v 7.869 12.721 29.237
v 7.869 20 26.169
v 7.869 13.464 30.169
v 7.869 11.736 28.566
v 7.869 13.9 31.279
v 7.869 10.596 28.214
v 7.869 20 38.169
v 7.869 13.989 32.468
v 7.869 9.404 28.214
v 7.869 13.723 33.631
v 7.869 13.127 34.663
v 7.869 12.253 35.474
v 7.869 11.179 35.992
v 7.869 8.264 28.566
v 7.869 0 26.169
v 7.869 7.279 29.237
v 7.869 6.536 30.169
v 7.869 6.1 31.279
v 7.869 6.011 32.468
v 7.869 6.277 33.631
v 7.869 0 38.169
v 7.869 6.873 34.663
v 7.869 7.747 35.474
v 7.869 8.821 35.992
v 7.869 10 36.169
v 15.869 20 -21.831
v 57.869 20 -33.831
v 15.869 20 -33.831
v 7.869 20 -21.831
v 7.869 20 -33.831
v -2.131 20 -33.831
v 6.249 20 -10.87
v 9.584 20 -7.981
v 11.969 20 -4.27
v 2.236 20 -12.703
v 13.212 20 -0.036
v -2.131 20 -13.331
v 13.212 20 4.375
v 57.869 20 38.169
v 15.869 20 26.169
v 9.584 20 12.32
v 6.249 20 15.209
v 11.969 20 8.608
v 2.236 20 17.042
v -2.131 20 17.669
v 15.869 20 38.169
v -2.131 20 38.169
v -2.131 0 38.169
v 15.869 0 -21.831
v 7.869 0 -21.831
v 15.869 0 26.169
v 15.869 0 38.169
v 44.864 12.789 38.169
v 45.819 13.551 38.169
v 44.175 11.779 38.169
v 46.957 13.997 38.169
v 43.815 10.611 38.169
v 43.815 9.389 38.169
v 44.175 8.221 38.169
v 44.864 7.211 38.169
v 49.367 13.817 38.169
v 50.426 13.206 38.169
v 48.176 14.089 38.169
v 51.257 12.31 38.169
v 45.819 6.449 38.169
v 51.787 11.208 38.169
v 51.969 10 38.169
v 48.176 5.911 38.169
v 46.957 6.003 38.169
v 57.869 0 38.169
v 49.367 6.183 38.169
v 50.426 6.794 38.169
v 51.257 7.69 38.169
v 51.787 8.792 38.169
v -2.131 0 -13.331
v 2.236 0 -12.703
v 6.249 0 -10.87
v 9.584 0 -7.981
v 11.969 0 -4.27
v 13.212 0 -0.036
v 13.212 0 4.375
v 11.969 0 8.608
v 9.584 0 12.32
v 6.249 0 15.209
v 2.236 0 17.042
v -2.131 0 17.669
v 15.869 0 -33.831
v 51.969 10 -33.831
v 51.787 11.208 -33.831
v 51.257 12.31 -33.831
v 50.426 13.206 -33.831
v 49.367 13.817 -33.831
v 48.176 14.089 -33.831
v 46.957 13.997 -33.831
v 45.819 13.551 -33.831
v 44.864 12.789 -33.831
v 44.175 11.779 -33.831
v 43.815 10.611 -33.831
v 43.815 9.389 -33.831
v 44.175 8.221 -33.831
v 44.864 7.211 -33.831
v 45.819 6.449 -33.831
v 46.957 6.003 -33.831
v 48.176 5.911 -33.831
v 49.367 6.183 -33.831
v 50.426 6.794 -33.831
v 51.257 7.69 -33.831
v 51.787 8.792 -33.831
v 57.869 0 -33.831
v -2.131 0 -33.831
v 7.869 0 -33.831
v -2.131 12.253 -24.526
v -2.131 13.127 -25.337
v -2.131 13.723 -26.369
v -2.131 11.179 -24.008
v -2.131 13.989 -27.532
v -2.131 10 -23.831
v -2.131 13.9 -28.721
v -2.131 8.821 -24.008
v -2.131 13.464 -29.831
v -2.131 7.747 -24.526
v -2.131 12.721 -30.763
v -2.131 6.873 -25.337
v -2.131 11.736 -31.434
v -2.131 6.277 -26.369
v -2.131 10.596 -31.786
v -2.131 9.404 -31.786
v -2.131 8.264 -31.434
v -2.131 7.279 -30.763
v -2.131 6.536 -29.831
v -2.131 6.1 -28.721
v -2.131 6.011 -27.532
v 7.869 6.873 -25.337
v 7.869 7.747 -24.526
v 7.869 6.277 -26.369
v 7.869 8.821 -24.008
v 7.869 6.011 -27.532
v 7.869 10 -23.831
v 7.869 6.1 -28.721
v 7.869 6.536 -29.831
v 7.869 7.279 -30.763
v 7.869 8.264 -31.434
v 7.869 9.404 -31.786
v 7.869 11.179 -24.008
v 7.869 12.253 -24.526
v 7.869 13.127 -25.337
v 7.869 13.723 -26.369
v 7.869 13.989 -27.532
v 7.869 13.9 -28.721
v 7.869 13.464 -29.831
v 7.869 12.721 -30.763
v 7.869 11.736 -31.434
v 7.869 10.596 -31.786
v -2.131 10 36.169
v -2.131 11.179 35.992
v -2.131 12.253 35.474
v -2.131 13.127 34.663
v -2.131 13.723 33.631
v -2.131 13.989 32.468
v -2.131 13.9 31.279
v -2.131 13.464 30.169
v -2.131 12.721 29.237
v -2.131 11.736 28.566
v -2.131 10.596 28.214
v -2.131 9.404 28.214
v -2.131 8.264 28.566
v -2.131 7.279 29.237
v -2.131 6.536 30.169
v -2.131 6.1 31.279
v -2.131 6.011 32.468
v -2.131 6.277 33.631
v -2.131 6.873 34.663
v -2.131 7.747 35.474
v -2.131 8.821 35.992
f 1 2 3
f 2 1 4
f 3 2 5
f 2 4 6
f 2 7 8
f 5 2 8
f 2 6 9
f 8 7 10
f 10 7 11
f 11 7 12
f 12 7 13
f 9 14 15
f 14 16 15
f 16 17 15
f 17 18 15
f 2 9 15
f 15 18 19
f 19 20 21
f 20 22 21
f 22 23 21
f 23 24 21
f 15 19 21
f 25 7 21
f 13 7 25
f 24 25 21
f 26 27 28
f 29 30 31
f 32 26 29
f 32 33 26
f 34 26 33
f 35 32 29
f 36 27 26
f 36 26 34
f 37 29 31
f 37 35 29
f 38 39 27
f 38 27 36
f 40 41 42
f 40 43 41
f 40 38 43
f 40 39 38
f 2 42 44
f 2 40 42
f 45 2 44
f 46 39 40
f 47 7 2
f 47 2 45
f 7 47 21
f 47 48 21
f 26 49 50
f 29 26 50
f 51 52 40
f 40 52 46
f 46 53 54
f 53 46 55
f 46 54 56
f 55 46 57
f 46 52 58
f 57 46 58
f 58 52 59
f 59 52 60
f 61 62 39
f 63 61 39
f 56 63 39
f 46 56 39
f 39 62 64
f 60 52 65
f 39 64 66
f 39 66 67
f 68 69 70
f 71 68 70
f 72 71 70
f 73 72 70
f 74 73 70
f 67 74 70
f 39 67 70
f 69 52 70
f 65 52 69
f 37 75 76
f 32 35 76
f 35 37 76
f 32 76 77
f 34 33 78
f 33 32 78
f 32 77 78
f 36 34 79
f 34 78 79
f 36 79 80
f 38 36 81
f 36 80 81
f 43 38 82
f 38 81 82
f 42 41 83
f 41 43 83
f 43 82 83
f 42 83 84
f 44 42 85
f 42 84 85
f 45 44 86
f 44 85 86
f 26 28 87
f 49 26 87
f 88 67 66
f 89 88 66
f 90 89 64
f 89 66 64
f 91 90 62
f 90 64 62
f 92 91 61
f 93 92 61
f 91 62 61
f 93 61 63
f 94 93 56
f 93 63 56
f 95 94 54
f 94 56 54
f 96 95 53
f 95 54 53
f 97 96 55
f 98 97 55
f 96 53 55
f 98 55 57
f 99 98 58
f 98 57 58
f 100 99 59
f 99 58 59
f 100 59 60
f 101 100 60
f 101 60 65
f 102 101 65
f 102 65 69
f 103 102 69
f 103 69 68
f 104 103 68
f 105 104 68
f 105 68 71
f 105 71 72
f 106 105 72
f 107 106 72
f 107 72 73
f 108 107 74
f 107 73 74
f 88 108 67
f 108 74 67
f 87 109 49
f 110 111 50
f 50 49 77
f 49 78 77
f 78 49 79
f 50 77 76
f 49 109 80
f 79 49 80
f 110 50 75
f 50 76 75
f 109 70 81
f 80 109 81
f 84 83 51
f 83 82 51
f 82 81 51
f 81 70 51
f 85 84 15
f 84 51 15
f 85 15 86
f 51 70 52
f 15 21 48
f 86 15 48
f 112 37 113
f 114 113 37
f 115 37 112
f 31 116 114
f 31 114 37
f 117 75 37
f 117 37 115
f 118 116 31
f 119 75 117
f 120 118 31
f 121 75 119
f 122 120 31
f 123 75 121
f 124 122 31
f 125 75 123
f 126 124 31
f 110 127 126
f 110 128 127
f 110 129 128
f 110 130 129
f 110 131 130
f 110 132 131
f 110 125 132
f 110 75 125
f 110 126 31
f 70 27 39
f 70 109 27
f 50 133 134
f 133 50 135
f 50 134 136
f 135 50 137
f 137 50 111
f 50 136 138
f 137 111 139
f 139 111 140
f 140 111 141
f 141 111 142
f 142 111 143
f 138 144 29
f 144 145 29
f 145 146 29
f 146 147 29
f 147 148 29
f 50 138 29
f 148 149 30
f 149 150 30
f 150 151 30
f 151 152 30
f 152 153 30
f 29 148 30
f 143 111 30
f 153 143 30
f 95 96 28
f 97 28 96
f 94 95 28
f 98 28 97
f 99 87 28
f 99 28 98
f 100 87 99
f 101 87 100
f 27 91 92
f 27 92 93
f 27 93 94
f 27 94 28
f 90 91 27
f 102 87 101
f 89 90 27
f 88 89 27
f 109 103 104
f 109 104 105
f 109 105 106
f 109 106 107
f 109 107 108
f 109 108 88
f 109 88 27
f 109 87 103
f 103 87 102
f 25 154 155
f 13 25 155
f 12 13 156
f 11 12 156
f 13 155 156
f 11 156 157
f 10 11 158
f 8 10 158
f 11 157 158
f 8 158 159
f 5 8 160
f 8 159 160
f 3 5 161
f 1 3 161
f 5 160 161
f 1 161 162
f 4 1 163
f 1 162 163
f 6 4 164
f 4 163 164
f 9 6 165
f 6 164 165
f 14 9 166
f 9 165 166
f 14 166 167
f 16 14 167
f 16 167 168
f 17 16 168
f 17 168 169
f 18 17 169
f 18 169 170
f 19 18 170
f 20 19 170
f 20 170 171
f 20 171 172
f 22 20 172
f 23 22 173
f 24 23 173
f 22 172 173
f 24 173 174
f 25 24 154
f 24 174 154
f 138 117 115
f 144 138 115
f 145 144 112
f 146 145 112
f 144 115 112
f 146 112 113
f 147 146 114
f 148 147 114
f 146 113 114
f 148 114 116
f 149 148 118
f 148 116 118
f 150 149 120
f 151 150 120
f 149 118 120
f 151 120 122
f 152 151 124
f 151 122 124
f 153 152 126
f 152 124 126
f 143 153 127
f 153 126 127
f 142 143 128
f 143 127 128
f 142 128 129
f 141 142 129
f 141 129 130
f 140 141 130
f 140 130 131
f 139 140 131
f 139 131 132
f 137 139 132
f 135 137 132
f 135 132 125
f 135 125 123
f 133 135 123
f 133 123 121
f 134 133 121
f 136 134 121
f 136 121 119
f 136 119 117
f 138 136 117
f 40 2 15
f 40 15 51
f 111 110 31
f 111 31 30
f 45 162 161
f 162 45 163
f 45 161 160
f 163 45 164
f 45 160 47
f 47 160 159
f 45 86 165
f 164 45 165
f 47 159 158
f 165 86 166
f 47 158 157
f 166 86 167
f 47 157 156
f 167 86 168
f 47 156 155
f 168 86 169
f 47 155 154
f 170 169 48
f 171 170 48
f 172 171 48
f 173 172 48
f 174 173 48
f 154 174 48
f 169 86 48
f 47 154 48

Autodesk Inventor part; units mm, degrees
ref_plane "YZ Plane" through (0, 0, 0) normal (1, 0, 0) x (0, 1, 0)
ref_plane "XZ Plane" through (0, 0, 0) normal (0, 1, 0) x (-1, 0, 0)
ref_plane "XY Plane" through (0, 0, 0) normal (0, 0, 1) x (1, 0, 0)
sketch "Sketch1" plane through (0, 0, 0) normal (0, 1, 0) x (-1, 0, 0)
  circle A0 centre (2.1306, 2.1694) radius 15.5
  line L0 (2.1306, 17.6694) -> (2.1306, 38.1694)
  line L1 (2.1306, -13.3306) -> (2.1306, -33.8306)
  line L2 (2.1306, 38.1694) -> (-57.8694, 38.1694)
  line L3 (2.1306, -33.8306) -> (-57.8694, -33.8306)
  line L4 (-57.8694, -33.8306) -> (-57.8694, 38.1694)
  line L5 (2.1306, 38.1694) -> (34.8074, 38.1694)
  line L6 (34.8074, 38.1694) -> (34.8074, -33.8306)
  line L7 (34.8074, -33.8306) -> (2.1306, -33.8306)
  circle A1 centre (2.1306, 2.1694) radius 15.25
  point P0 (0, 0)
  dimension "d0" = 31
  dimension "d1" = 20.5
  dimension "d2" = 20.5
  dimension "d3" = 60
  dimension "d4" = 30.5
extrude "Extrusion1" add sketch "Sketch1" along normal blind 20 contours A0 L1 L3 L4 L2 L0
ref_plane "Work Plane1" through (-2.1306, 0, 38.1694) normal (0, 0, 1) x (1, 0, 0)
sketch "Sketch2" plane through (-2.1306, 0, 38.1694) normal (0, 0, 1) x (1, 0, 0)
  line L0 (60, 0) -> (60, 20) projected
  line L1 (60, 10) -> (50, 10)
  circle A0 centre (50, 10) radius 4.1
  point P0 (2.1306, 0)
  dimension "d31" = 8.2
extrude "Extrusion2" cut sketch "Sketch2" against normal blind 192.5
ref_plane "Work Plane2" through (-2.1306, 0, 17.6694) normal (-1, 0, 0) x (0, 0, 1)
sketch "Sketch3" plane through (-2.1306, 0, 17.6694) normal (-1, 0, 0) x (0, 0, 1)
  point P0 (-17.6694, 0)
sketch "Sketch4" plane through (-2.1306, 0, 17.6694) normal (-1, 0, 0) x (0, 0, 1)
  line L0 (20.5, 0) -> (20.5, 20) projected
  circle A0 centre (14.5, 10) radius 4
  point P0 (-17.6694, 0)
  dimension "d14" = 8
sketch "Sketch5" plane through (-2.1306, 0, 38.1694) normal (0, 0, 1) x (1, 0, 0)
  line L0 (0, 0) -> (0, 20) projected
  line L1 (60, 0) -> (0, 0) projected
  line L2 (10, 0) -> (18, 0)
  line L3 (18, 0) -> (18, 20.6661)
  line L4 (18, 20.6661) -> (10, 20.6661)
  line L5 (10, 20.6661) -> (10, 0)
  point P0 (2.1306, 0)
  dimension "d16" = 8
extrude "Extrusion3" cut sketch "Sketch5" against normal blind 12
extrude "Extrusion4" cut sketch "Sketch4" against normal blind 12.5
ref_plane "Work Plane3" through (-2.1306, 0, -33.8306) normal (-1, 0, 0) x (0, 0, 1)
sketch "Sketch6" plane through (-2.1306, 0, -33.8306) normal (-1, 0, 0) x (0, 0, 1)
  line L0 (0, 6) -> (0, 14) projected
  circle A0 centre (6, 10) radius 4
  point P0 (33.8306, 0)
  dimension "d23" = 8
ref_plane "Work Plane4" through (57.8694, 0, -33.8306) normal (0, 0, -1) x (-1, 0, 0)
sketch "Sketch7" plane through (57.8694, 0, -33.8306) normal (0, 0, -1) x (-1, 0, 0)
  line L0 (60, 0) -> (60, 20) projected
  line L1 (50, 0) -> (50, 20) projected
  line L2 (50, 10) -> (50, 20)
  line L3 (0, 0) -> (60, 0) projected
  line L4 (50, 20) -> (42, 20)
  line L5 (42, 20) -> (42, 0)
  line L6 (42, 0) -> (50, 0)
  line L7 (50, 0) -> (50, 20)
  point P0 (57.8694, 0)
  dimension "d26" = 8
extrude "Extrusion5" cut sketch "Sketch7" against normal blind 12
extrude "Extrusion6" cut sketch "Sketch6" against normal blind 11.75
sketch "Sketch8" plane through (-2.1306, 0, 17.6694) normal (-1, 0, 0) x (0, 0, 1)
  point P0 (-17.6694, 0)
properties part number "BIKE"
